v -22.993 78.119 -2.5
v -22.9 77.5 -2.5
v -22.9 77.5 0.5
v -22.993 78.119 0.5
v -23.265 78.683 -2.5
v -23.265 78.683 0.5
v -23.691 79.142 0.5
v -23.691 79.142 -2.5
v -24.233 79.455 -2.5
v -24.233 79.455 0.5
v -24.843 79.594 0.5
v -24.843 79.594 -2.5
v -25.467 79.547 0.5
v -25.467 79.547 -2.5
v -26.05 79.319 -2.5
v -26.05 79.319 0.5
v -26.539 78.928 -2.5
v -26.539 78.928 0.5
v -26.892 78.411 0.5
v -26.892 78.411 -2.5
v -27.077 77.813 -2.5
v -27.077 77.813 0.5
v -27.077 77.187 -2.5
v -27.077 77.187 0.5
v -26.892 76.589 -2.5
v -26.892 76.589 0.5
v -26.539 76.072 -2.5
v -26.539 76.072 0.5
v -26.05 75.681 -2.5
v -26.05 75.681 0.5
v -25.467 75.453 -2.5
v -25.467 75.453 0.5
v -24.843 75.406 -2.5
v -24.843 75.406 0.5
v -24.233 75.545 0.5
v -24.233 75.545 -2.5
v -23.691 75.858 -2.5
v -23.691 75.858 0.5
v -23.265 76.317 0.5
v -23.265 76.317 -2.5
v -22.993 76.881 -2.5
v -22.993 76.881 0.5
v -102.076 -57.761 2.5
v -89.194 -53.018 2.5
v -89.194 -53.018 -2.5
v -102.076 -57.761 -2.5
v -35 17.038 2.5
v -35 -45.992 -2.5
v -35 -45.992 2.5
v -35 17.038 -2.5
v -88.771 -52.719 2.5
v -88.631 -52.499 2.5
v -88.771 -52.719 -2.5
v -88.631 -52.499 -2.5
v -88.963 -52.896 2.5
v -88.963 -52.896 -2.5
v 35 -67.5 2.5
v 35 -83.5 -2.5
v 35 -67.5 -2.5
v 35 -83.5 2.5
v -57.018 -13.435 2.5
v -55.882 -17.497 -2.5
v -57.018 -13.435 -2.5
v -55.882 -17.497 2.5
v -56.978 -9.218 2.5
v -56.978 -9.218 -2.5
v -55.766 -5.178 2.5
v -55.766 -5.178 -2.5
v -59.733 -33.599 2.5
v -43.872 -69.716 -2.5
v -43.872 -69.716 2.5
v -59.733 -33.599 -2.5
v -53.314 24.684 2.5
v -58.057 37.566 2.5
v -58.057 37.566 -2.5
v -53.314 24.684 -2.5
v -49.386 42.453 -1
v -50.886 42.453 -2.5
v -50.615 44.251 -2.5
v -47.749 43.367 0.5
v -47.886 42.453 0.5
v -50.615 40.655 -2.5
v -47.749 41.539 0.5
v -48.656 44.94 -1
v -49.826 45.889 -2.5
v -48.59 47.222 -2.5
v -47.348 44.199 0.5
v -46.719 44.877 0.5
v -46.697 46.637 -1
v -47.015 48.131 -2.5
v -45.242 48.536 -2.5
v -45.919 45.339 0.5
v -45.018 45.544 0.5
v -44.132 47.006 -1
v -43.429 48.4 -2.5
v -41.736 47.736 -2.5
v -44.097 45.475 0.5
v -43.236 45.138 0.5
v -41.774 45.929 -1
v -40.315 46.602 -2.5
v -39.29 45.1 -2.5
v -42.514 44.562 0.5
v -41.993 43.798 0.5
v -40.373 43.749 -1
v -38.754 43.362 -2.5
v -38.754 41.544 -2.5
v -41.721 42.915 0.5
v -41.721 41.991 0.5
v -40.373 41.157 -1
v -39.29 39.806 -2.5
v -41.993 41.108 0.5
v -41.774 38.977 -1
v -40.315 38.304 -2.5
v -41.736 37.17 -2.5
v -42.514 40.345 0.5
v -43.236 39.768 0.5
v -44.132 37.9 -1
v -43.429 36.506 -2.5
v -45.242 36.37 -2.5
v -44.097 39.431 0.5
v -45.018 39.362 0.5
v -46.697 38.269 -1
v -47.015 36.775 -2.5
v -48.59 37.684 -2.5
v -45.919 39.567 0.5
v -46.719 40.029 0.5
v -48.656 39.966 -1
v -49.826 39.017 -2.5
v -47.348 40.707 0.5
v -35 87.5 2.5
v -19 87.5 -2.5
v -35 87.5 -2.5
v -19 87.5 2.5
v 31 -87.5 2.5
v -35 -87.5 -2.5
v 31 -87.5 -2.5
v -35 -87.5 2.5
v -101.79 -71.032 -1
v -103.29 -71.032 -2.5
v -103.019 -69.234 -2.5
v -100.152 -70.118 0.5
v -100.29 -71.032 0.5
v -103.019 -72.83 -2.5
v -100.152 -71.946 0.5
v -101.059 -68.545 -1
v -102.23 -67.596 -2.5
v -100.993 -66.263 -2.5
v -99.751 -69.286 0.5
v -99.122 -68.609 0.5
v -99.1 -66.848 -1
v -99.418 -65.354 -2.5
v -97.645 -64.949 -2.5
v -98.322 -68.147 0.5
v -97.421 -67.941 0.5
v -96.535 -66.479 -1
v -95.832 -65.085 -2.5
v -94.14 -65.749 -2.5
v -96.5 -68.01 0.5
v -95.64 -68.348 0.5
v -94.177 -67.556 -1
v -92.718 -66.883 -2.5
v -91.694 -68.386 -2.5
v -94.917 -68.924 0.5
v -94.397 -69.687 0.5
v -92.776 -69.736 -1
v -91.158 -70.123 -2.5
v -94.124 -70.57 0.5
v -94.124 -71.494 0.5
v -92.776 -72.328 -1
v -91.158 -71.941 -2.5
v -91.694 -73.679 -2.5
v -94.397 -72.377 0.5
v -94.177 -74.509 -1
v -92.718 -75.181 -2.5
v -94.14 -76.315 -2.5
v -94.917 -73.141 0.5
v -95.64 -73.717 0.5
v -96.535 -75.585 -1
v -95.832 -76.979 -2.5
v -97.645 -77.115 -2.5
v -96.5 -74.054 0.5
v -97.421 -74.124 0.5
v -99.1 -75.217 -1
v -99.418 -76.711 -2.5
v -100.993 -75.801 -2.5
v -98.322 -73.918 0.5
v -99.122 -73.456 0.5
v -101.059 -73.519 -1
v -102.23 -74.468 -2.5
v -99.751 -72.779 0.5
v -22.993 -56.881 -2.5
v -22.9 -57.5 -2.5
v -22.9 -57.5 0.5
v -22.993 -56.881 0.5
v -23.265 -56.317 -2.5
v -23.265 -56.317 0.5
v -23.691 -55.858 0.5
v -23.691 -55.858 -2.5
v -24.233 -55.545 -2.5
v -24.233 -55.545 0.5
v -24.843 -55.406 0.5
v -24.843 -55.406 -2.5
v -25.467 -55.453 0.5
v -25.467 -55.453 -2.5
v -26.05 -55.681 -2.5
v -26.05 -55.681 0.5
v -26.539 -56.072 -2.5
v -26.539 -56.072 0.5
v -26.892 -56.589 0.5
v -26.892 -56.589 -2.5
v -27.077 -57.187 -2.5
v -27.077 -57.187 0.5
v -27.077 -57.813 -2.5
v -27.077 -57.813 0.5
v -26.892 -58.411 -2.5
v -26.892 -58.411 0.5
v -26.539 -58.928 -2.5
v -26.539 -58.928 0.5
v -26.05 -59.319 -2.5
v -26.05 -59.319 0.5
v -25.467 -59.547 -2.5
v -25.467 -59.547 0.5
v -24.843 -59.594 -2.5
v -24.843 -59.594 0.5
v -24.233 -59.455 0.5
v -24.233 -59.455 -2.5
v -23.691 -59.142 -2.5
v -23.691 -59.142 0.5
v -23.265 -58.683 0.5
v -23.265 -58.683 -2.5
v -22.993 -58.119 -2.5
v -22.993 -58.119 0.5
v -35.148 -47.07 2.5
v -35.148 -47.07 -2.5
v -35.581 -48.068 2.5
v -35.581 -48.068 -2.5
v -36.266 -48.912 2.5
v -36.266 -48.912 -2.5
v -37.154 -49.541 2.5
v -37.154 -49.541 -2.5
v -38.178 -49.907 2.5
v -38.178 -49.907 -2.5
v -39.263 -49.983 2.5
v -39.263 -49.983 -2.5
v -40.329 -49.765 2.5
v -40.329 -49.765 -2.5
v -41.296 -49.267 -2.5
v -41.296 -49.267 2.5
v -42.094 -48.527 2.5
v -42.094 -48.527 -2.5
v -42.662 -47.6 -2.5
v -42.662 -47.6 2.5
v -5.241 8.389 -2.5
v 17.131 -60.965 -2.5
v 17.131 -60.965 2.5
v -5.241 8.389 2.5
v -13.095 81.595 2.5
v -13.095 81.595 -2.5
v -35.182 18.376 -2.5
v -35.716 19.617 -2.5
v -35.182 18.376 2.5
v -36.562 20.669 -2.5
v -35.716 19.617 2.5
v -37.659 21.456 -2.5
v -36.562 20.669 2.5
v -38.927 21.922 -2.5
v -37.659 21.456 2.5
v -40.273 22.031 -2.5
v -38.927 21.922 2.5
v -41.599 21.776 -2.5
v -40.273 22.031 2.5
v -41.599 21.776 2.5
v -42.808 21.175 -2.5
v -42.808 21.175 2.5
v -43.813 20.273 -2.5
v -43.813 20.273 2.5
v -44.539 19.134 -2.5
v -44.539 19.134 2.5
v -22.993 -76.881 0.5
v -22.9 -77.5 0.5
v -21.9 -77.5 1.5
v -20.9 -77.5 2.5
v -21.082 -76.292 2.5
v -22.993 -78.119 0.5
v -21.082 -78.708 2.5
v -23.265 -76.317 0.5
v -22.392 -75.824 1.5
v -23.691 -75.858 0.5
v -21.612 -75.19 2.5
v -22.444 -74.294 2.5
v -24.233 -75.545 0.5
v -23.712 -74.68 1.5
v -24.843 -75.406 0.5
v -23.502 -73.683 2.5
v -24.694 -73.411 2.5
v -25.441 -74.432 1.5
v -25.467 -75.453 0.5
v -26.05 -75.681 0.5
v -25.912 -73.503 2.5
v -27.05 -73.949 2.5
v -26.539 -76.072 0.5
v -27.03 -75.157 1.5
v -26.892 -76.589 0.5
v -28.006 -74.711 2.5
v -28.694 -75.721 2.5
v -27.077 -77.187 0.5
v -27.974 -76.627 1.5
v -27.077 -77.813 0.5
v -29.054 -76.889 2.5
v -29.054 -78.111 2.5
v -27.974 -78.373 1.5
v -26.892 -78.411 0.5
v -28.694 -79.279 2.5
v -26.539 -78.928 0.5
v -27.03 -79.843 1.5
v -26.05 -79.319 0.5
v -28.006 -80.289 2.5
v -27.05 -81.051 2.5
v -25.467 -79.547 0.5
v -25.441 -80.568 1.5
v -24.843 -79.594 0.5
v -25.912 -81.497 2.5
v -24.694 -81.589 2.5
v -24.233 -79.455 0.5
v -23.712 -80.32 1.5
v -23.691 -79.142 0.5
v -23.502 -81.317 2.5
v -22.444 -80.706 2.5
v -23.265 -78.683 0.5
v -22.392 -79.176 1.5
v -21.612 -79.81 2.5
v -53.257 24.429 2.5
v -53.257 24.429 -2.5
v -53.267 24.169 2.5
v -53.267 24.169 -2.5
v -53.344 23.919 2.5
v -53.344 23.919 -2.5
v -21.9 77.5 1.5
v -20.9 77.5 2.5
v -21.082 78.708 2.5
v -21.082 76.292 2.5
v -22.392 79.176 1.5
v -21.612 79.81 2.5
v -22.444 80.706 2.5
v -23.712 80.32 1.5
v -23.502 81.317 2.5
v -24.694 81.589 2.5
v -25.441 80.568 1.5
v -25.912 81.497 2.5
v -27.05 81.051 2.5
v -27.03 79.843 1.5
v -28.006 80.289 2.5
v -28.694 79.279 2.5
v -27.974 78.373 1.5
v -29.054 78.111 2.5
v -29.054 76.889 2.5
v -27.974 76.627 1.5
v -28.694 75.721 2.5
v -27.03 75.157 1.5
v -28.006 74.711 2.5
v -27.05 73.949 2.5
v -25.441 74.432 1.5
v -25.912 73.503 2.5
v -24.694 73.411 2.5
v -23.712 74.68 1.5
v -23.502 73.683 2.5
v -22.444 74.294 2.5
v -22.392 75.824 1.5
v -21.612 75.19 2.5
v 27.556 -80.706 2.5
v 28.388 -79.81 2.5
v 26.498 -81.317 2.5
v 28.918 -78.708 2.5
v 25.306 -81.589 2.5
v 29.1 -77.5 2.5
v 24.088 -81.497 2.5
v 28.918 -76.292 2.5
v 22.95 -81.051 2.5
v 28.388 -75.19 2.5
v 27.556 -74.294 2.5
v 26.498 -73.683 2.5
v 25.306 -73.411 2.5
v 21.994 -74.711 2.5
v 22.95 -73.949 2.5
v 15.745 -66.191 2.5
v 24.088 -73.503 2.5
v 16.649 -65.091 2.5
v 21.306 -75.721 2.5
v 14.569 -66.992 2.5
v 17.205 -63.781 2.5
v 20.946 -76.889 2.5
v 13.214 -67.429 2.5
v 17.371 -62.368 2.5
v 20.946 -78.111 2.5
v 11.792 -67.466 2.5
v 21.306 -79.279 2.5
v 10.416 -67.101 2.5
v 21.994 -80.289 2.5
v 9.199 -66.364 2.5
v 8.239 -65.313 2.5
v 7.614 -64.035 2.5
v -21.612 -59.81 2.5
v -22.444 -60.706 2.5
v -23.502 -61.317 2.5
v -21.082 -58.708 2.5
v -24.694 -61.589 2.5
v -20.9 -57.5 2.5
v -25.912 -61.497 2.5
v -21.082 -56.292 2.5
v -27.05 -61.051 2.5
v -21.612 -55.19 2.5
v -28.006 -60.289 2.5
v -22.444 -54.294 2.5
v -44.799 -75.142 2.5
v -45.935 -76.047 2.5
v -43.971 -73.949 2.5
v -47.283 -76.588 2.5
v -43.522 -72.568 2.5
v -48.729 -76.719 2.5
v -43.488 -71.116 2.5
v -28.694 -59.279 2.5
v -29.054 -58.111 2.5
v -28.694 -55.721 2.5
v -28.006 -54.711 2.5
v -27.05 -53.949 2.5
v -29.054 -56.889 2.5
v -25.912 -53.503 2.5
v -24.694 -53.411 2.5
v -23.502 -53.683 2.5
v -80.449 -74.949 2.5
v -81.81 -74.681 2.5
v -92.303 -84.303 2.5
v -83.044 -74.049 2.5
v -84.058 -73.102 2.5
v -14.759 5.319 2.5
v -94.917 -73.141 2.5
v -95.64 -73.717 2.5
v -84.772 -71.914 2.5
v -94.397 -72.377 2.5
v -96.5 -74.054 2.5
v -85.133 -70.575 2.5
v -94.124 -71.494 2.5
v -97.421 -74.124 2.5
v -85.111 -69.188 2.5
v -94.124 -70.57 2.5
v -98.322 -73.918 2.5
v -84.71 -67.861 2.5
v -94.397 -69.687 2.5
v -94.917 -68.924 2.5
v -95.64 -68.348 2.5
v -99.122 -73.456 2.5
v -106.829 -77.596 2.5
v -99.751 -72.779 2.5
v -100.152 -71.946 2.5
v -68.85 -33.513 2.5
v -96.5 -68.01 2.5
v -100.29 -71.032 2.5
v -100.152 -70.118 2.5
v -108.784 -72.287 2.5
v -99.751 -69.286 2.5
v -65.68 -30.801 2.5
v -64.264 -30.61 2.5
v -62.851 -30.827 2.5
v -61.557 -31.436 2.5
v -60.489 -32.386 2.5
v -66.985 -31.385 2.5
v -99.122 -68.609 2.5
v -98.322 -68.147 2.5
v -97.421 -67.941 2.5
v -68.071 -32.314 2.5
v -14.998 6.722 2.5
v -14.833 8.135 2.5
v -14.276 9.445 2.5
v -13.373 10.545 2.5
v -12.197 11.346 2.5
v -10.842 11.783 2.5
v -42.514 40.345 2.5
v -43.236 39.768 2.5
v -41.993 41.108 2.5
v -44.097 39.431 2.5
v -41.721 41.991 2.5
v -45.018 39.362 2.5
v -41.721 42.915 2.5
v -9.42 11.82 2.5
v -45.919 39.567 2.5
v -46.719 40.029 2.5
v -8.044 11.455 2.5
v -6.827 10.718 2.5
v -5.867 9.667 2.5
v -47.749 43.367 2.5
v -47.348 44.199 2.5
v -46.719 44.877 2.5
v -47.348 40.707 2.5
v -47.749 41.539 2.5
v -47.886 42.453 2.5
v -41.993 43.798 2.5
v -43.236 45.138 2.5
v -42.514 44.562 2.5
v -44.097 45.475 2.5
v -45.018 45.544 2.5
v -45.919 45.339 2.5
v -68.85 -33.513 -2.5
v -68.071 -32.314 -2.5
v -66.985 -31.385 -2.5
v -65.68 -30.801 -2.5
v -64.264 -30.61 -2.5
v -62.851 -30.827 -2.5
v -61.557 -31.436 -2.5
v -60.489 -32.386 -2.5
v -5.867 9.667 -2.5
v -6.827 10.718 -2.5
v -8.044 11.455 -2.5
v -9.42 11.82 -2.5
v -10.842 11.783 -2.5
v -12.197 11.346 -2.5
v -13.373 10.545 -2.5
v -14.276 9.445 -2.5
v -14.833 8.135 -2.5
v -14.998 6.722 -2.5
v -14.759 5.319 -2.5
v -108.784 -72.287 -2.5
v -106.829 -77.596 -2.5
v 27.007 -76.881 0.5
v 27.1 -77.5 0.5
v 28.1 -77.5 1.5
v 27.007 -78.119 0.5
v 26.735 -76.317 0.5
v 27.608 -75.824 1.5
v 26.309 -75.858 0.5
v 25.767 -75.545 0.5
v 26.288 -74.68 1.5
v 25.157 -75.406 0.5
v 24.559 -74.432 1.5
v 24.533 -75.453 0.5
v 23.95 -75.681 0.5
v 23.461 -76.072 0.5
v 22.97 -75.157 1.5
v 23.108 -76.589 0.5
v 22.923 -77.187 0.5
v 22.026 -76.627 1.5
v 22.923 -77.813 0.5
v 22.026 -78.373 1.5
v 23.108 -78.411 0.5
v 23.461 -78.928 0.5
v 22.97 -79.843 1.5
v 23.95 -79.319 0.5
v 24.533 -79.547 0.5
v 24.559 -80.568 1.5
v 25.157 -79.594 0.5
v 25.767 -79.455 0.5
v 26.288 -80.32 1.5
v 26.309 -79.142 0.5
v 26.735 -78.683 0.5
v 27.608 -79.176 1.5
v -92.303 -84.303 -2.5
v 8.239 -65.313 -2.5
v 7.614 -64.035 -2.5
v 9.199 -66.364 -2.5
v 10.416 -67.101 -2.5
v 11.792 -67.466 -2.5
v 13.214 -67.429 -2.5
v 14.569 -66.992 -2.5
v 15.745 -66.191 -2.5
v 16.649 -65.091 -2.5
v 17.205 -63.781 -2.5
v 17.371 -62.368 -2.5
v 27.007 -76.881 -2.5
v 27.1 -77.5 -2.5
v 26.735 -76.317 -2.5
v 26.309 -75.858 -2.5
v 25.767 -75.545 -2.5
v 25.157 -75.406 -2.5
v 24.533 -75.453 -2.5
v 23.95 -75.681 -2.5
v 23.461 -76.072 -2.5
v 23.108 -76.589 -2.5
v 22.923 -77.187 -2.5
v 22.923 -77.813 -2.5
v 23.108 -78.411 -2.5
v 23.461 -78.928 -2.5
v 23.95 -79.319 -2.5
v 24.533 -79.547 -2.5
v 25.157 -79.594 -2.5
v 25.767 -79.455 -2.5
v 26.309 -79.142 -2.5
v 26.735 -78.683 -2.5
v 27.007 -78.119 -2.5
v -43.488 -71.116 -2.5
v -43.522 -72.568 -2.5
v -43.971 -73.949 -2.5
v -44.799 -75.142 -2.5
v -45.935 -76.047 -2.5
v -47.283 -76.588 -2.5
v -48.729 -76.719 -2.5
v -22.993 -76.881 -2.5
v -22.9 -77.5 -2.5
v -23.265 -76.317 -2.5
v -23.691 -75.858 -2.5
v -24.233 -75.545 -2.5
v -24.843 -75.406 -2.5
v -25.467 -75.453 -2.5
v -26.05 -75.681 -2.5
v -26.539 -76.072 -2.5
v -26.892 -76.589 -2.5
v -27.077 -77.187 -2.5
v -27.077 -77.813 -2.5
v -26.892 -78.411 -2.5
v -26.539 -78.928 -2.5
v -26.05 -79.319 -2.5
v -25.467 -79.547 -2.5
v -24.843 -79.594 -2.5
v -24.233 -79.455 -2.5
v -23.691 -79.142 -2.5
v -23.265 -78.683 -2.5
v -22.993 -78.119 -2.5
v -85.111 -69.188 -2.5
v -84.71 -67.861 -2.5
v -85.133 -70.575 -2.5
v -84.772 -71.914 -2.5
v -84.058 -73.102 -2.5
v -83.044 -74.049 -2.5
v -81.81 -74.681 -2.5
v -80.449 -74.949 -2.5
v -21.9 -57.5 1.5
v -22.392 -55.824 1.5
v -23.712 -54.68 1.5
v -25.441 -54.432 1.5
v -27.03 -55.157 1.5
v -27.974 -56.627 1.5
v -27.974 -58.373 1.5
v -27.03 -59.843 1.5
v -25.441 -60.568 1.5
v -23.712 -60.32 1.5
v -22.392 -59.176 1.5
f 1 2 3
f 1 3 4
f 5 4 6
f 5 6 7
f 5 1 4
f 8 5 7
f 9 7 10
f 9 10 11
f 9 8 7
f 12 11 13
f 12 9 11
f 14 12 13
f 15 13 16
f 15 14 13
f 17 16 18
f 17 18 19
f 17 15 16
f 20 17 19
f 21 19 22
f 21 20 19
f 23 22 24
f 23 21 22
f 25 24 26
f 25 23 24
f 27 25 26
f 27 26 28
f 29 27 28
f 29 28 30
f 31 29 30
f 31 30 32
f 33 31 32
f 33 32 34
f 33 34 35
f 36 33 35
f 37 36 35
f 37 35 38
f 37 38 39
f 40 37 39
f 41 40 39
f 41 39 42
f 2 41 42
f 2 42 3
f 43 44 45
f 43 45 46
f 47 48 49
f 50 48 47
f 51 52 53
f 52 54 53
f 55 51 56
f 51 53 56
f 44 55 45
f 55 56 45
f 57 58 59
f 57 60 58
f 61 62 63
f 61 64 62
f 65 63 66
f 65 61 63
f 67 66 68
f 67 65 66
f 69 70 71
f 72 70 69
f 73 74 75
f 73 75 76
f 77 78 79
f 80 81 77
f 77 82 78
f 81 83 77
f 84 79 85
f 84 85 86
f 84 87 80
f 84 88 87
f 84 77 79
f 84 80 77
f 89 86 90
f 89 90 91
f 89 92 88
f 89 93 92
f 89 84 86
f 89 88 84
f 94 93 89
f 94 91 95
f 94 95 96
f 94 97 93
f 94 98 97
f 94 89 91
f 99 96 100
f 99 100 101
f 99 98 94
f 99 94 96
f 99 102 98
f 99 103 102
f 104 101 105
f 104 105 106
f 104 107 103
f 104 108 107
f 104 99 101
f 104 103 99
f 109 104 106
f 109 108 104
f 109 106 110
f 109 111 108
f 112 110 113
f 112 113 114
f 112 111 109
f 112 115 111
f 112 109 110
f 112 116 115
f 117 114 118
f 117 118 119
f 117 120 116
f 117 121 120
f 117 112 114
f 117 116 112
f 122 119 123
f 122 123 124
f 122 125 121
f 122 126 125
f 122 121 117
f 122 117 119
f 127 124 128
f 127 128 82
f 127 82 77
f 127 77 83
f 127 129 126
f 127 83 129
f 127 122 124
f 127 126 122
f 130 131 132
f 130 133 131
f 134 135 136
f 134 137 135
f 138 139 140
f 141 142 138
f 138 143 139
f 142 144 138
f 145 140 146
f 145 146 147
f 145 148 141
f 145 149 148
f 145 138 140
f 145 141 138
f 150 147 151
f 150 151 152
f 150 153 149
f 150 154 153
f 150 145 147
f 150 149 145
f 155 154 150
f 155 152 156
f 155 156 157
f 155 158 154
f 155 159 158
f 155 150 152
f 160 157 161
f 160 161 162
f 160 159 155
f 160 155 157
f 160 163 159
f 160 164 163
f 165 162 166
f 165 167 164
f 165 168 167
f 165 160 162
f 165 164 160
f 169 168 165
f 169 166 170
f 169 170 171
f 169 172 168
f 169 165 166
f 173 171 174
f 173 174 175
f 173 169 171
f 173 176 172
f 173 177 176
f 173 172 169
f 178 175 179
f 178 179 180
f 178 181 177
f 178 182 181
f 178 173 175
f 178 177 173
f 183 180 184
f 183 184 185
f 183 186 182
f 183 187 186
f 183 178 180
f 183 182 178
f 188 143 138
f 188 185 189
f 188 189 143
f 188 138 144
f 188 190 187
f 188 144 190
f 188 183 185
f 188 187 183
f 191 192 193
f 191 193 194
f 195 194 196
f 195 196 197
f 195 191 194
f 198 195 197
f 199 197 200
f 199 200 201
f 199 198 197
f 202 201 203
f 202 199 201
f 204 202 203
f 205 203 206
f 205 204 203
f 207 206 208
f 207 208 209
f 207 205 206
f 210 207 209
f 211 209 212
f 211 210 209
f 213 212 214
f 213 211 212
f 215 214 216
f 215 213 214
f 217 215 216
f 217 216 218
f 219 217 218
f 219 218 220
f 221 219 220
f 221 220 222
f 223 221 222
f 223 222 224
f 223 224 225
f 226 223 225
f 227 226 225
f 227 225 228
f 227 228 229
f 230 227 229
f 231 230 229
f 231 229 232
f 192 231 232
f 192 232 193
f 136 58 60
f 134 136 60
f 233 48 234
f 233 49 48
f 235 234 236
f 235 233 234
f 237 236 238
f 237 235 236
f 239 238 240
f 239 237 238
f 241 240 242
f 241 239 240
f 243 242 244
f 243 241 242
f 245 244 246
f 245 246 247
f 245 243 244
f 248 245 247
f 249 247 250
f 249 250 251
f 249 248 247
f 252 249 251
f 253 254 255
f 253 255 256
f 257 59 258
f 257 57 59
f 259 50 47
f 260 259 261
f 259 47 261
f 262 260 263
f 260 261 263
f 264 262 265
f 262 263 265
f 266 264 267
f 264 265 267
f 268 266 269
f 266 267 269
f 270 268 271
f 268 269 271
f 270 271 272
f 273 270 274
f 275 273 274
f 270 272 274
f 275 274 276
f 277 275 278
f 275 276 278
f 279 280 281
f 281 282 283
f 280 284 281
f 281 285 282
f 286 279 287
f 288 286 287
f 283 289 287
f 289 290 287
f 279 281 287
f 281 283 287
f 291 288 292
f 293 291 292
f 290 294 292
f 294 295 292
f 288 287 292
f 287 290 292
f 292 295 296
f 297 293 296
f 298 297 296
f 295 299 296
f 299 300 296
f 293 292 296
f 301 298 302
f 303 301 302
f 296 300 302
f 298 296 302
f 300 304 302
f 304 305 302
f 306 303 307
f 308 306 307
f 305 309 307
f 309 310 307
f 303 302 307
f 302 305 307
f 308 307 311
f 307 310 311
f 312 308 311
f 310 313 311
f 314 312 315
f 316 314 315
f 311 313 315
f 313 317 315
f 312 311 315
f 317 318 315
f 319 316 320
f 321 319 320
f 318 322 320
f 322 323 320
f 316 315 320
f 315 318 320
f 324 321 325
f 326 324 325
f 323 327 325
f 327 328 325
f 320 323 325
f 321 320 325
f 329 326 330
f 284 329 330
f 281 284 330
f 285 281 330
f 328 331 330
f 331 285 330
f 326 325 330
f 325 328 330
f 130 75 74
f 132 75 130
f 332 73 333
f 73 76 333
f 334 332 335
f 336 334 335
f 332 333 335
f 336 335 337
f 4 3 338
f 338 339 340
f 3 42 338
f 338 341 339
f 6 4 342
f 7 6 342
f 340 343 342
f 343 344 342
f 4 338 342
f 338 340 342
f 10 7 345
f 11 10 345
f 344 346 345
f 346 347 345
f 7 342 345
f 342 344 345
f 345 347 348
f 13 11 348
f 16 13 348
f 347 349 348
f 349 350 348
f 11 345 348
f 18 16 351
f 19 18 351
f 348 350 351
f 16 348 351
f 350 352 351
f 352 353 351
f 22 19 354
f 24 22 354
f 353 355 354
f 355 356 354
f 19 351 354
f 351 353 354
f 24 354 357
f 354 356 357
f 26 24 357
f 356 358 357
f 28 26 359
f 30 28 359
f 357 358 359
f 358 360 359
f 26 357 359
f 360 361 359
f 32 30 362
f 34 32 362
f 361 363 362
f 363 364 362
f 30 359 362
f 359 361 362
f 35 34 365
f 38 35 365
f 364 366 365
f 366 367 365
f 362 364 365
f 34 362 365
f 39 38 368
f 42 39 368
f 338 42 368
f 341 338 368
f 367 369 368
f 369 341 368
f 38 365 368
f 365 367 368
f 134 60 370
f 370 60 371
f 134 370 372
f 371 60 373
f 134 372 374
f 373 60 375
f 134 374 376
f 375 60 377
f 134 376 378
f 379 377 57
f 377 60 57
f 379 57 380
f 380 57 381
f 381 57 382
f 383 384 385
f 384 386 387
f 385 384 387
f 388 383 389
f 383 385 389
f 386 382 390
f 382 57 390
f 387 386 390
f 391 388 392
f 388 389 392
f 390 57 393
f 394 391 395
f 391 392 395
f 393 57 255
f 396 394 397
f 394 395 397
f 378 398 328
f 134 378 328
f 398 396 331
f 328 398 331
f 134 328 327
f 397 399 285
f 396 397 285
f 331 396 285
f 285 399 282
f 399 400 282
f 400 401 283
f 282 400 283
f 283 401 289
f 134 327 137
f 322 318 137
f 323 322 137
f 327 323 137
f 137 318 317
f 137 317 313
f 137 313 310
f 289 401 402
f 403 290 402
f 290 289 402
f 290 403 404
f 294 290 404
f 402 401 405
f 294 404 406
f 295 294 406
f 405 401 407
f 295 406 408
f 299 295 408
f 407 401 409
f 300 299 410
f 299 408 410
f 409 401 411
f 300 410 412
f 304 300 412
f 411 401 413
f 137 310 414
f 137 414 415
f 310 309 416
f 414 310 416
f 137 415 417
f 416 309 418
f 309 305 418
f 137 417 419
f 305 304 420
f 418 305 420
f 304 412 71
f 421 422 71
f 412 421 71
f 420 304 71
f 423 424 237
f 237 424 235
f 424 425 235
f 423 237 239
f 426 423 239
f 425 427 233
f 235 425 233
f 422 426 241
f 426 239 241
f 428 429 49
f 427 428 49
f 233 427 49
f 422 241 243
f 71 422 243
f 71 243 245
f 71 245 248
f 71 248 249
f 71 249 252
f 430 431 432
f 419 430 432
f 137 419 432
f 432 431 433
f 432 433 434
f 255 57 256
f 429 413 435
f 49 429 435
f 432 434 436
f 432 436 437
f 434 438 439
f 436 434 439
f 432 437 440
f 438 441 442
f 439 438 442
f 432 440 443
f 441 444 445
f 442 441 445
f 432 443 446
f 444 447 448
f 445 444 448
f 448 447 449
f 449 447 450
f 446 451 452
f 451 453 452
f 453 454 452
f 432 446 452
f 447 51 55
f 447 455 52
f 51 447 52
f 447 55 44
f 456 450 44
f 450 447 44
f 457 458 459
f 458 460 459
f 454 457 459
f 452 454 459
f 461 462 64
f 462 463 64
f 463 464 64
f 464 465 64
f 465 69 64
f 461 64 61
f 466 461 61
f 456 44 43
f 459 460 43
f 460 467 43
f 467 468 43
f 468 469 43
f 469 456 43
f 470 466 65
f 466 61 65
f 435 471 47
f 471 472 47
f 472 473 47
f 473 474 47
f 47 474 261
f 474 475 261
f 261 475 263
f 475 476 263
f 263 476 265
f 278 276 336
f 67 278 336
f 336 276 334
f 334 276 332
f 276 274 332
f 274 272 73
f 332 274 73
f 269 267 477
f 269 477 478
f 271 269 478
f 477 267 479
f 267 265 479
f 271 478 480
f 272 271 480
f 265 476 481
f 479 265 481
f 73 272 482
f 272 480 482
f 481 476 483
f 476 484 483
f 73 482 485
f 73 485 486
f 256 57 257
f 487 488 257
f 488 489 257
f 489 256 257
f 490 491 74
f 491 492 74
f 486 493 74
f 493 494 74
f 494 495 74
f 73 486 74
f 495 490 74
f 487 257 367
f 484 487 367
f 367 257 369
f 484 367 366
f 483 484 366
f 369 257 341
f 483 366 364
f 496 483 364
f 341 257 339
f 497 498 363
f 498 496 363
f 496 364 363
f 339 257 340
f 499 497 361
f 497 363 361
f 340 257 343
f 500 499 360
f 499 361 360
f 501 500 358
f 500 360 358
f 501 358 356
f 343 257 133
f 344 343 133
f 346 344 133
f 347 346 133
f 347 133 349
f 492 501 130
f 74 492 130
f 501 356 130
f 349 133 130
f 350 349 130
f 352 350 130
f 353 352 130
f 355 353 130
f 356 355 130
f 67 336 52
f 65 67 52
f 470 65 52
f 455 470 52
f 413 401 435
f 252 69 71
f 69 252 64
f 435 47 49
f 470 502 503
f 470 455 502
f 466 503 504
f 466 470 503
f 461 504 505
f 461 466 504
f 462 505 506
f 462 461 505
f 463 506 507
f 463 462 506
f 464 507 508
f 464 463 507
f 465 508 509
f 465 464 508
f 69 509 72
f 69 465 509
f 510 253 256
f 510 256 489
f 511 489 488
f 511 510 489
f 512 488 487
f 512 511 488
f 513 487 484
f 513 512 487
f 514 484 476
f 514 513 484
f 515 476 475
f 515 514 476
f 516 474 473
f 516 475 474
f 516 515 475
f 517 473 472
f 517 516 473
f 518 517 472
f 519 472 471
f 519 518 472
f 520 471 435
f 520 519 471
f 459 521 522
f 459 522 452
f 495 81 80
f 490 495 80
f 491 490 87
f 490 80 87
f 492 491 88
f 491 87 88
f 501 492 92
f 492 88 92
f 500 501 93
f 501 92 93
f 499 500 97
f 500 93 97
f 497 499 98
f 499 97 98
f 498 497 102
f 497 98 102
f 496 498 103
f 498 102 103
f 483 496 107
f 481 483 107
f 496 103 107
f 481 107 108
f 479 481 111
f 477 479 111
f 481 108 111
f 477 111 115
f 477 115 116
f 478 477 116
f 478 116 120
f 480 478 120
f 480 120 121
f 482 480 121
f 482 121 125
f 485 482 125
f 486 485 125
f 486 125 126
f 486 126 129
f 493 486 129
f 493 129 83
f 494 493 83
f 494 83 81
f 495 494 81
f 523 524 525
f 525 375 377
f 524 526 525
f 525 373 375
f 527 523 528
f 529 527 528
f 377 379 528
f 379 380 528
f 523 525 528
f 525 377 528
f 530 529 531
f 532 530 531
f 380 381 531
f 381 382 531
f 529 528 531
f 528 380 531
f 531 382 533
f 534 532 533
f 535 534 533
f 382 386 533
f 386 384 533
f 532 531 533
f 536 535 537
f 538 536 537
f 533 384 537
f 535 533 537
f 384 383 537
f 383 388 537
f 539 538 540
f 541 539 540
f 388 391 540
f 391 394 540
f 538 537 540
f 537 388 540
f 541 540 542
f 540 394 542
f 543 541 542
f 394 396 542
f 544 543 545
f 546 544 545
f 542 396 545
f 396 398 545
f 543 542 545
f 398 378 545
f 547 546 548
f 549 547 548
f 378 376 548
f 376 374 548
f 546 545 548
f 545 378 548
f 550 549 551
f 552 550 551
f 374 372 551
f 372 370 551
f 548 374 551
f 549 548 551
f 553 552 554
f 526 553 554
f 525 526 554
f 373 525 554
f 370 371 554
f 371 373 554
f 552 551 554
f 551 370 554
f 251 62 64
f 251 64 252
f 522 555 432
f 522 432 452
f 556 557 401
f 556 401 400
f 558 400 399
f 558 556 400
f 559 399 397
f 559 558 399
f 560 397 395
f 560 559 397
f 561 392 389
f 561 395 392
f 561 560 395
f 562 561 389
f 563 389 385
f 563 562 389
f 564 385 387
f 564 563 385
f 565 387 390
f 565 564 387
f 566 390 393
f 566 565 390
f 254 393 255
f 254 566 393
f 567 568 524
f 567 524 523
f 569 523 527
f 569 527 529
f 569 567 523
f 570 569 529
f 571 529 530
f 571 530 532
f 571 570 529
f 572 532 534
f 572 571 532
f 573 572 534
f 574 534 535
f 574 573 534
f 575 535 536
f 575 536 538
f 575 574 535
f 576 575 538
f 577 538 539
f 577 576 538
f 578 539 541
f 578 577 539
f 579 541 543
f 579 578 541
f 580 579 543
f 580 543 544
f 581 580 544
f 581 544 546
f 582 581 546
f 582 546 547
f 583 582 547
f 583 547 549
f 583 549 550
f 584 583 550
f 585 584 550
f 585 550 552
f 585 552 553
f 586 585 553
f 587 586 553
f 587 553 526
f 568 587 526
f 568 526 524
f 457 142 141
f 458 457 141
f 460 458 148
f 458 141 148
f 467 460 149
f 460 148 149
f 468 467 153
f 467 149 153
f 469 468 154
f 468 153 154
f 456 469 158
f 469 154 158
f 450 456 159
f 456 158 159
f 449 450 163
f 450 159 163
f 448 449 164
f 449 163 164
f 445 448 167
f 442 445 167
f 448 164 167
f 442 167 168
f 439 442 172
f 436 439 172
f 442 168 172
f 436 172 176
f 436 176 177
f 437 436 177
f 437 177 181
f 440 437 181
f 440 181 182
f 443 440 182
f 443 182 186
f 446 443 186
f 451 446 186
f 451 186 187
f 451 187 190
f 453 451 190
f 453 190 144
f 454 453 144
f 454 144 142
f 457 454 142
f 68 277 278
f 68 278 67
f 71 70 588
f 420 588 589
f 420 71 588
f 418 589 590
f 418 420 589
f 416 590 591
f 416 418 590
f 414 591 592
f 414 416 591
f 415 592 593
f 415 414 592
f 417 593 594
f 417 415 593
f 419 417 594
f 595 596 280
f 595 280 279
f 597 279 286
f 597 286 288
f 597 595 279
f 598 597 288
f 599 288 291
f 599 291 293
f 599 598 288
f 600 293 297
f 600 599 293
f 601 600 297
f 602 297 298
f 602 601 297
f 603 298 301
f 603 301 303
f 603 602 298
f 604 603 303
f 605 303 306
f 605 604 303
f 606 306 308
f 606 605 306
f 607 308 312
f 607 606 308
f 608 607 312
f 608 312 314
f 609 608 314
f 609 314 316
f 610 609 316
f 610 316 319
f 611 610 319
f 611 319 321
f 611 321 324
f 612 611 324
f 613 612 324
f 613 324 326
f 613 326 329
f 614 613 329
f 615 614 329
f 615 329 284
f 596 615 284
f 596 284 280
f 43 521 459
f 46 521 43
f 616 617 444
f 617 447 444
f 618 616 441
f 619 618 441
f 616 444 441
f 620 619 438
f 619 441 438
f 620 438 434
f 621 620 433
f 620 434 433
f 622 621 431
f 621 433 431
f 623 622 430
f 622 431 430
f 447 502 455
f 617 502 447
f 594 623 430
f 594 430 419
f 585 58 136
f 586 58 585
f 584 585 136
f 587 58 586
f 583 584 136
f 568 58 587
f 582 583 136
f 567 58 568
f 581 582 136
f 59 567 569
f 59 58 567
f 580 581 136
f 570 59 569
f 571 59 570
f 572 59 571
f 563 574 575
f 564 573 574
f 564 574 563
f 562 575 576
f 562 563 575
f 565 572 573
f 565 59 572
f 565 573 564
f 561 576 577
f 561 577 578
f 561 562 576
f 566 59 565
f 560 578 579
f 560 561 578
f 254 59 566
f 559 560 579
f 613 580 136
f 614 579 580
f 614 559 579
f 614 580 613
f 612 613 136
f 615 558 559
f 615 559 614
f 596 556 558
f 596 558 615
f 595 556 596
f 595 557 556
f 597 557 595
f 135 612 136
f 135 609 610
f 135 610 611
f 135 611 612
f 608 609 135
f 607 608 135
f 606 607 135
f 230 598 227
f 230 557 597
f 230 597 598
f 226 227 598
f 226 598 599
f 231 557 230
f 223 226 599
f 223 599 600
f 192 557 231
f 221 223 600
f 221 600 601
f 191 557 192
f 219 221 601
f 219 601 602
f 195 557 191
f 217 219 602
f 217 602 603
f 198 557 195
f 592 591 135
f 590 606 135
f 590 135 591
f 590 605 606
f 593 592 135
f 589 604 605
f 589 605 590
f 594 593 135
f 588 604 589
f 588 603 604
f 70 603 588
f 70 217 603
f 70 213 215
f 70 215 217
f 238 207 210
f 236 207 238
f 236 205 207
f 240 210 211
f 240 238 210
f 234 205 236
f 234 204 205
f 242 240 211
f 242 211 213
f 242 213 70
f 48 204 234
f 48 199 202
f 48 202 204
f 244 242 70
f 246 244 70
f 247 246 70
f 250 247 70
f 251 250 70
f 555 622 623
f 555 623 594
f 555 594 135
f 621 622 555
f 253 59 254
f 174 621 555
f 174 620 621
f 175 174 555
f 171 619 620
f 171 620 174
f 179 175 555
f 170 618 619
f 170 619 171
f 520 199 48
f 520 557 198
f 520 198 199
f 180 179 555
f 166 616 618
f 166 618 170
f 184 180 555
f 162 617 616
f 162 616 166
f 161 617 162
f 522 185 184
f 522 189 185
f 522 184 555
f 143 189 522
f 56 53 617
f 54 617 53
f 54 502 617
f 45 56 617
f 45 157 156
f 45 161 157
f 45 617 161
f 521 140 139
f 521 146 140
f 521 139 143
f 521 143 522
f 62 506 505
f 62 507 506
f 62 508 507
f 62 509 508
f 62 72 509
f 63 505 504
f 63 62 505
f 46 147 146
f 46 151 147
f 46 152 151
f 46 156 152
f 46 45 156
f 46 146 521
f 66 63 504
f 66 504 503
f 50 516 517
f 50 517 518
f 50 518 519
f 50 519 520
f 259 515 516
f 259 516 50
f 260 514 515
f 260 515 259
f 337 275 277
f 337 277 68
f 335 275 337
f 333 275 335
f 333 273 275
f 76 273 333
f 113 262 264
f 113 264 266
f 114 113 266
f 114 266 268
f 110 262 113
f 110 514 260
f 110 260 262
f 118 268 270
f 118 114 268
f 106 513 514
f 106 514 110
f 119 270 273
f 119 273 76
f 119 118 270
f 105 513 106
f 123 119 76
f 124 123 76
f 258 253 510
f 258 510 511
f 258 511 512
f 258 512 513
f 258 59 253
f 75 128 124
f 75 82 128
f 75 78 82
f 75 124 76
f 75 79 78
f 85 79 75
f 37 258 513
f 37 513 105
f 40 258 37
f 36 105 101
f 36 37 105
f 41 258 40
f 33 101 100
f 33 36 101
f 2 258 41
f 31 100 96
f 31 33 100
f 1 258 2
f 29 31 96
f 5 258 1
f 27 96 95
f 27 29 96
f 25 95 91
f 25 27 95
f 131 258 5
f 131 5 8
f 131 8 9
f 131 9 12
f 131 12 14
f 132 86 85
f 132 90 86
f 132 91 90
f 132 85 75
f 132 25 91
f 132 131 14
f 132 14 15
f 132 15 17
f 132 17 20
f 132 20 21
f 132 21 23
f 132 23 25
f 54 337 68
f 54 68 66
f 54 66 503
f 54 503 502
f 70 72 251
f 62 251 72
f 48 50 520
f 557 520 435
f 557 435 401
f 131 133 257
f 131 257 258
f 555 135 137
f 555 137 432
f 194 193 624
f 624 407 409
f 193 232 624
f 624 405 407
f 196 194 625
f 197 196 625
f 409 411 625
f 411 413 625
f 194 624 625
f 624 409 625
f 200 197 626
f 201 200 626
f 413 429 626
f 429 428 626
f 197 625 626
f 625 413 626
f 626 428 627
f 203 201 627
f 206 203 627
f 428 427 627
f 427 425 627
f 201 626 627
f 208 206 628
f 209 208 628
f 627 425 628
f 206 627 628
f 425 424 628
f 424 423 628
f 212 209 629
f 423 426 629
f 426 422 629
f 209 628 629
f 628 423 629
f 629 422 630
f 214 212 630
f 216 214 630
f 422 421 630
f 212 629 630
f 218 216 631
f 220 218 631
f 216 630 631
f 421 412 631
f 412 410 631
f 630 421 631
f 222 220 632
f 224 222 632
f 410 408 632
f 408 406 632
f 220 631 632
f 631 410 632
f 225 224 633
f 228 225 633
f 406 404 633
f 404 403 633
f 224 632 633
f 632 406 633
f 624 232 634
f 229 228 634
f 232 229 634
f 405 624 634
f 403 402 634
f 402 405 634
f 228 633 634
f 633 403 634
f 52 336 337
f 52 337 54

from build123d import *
from OCP.BRepFilletAPI import BRepFilletAPI_MakeChamfer

# Parameters (mm, degrees)
SKETCH_1_R          = 2.1
EXTRUDE_1_DEPTH     = 2.5
CUT_EXTRUDE_1_DEPTH = 95.372930441
EXTRUDE_2_DEPTH     = 5
CUT_EXTRUDE_2_DEPTH = 142.00635371
FILLET_1_R          = 5
FILLET_2_R          = 4
FILLET_3_R          = 15
CHAMFER_1_SIZE      = 4
CHAMFER_1_SIZE2     = 6.20437999
CHAMFER_2_SIZE      = 2
SKETCH_6_R          = 3.1
CUT_EXTRUDE_3_DEPTH = 140.696602049
CUT_EXTRUDE_4_DEPTH = 140.696602049
CHAMFER_3_SIZE      = 3
FILLET_4_R          = 1


with BuildPart() as part:
    # 草图1 → 凸台-拉伸1 (new, symmetric)
    with BuildSketch(Plane.XY):
        Polygon((-35, 87.5), (-35, -87.5), (35, -87.5), (35, -67.5), (-15, 87.5), align=None)
        with Locations((-25, -77.5)):
            Circle(SKETCH_1_R, mode=Mode.SUBTRACT)
        with Locations((25, -77.5)):
            Circle(SKETCH_1_R, mode=Mode.SUBTRACT)
        with Locations((-25, 77.5)):
            Circle(SKETCH_1_R, mode=Mode.SUBTRACT)
        with Locations((-25, -57.5)):
            Circle(SKETCH_1_R, mode=Mode.SUBTRACT)
    extrude(amount=EXTRUDE_1_DEPTH, both=True)

    # 草图2 → 切除-拉伸1 (cut, through all)
    with BuildSketch(Plane(origin=(0, 0, -2.5), x_dir=(-1, 0, 0), z_dir=(0, 0, -1))):
        with BuildLine():
            Line((-17.130804412, -60.9649861), (5.241456911, 8.389024))
            ThreePointArc((5.241456911, 8.389024), (11.5350139, 11.612553189), (14.758543089, 5.318996201))
            Line((14.758543089, 5.318996201), (-7.613718234, -64.0350139))
            ThreePointArc((-7.613718234, -64.0350139), (-13.907275222, -67.258543089), (-17.130804412, -60.9649861))
        make_face()
    extrude(amount=-CUT_EXTRUDE_1_DEPTH, mode=Mode.SUBTRACT)

    # 草图3 → 凸台-拉伸2 (add)
    with BuildSketch(Plane(origin=(0, 0, -2.5), x_dir=(-1, 0, 0), z_dir=(0, 0, -1))):
        Polygon((35, -87.5), (92.302946454, -84.303295451), (110.460589291, -75.918785529), (35, 87.5), align=None)
    extrude(amount=-EXTRUDE_2_DEPTH)

    # 草图5 → 切除-拉伸2 (cut, through all)
    with BuildSketch(Plane(origin=(0, 0, -2.5), x_dir=(-1, 0, 0), z_dir=(0, 0, -1))):
        Polygon((35, 39.792977913), (58.598142626, -11.311576727), (35, -65.049025296), align=None)
        Polygon((87.794289034, -74.539267276), (40.598003783, -77.172161204), (64.196146409, -23.434712635), align=None)
    extrude(amount=-CUT_EXTRUDE_2_DEPTH, mode=Mode.SUBTRACT)

    # 圆角1
    fillet_1_edges = [part.edges().sort_by_distance(p)[0] for p in [
        (-64.196146409, -23.434712635, 0),
        (-87.794289034, -74.539267276, 0),
        (-40.598003783, -77.172161204, 0),
        (-35, 39.792977913, 0),
    ]]
    fillet(fillet_1_edges, radius=FILLET_1_R)

    # 圆角2
    fillet_2_edges = [part.edges().sort_by_distance(p)[0] for p in [
        (-35, -65.049025296, 0),
    ]]
    fillet(fillet_2_edges, radius=FILLET_2_R)

    # 圆角3
    fillet_3_edges = [part.edges().sort_by_distance(p)[0] for p in [
        (-58.598142626, -11.311576727, 0),
    ]]
    fillet(fillet_3_edges, radius=FILLET_3_R)

    # 倒角1: one chamfer whose edges measure the first distance from different faces: ONE call of the kernel's chamfer builder (chamfer() names one face for all edges)
    chamfer_1_edges_1 = [part.edges().sort_by_distance(p)[0] for p in [
        (-110.460589291, -75.918785529, 0),
        (35, -87.5, 0),
    ]]
    chamfer_1_edges_2 = [part.edges().sort_by_distance(p)[0] for p in [
        (-15, 87.5, 0),
    ]]
    chamfer_1_side_2 = [part.faces().sort_by_distance(p)[0] for p in [
        (-25, 87.5, 0),
    ]]
    chamfer_1 = BRepFilletAPI_MakeChamfer(part.part.solid().wrapped)
    for e in chamfer_1_edges_1:
        chamfer_1.Add(CHAMFER_1_SIZE, e.wrapped)
    for e in chamfer_1_edges_2:
        chamfer_1.Add(CHAMFER_1_SIZE, CHAMFER_1_SIZE2, e.wrapped, chamfer_1_side_2[0].wrapped)  # the first distance lies on this face
    add(Compound.cast(chamfer_1.Shape()), mode=Mode.REPLACE)

    # 倒角2
    chamfer_2_edges = [part.edges().sort_by_distance(p)[0] for p in [
        (22.9, -77.5, 2.5),
        (-27.1, -77.5, 2.5),
        (-27.1, 77.5, 2.5),
        (-27.1, -57.5, 2.5),
    ]]
    chamfer(chamfer_2_edges, length=CHAMFER_2_SIZE)

    # 草图6 → 切除-拉伸3 (cut, through all)
    with BuildSketch(Plane(origin=(0, 0, -2.5), x_dir=(-1, 0, 0), z_dir=(0, 0, -1))):
        with Locations((97.189512912, -71.032219072)):
            Circle(SKETCH_6_R)
        with Locations((44.786325904, 42.453048657)):
            Circle(SKETCH_6_R)
    extrude(amount=-CUT_EXTRUDE_3_DEPTH, mode=Mode.SUBTRACT)

    # 草图7 → 切除-拉伸4 (cut, through all)
    with BuildSketch(Plane.XY.offset(2.5)):
        Polygon((-58.057402283, 37.566482199), (-53.170835826, 24.29540582), (-88.805002991, -52.874576235), (-102.07607937, -57.761142693), align=None)
    extrude(amount=-CUT_EXTRUDE_4_DEPTH, mode=Mode.SUBTRACT)

    # 倒角3
    chamfer_3_edges = [part.edges().sort_by_distance(p)[0] for p in [
        (-94.089512912, -71.032219072, -2.5),
        (-41.686325904, 42.453048657, -2.5),
    ]]
    chamfer(chamfer_3_edges, length=CHAMFER_3_SIZE)

    # 圆角4
    fillet_4_edges = [part.edges().sort_by_distance(p)[0] for p in [
        (-53.170835826, 24.29540582, 0),
        (-88.805002991, -52.874576235, 0),
    ]]
    fillet(fillet_4_edges, radius=FILLET_4_R)


solid = part.part
